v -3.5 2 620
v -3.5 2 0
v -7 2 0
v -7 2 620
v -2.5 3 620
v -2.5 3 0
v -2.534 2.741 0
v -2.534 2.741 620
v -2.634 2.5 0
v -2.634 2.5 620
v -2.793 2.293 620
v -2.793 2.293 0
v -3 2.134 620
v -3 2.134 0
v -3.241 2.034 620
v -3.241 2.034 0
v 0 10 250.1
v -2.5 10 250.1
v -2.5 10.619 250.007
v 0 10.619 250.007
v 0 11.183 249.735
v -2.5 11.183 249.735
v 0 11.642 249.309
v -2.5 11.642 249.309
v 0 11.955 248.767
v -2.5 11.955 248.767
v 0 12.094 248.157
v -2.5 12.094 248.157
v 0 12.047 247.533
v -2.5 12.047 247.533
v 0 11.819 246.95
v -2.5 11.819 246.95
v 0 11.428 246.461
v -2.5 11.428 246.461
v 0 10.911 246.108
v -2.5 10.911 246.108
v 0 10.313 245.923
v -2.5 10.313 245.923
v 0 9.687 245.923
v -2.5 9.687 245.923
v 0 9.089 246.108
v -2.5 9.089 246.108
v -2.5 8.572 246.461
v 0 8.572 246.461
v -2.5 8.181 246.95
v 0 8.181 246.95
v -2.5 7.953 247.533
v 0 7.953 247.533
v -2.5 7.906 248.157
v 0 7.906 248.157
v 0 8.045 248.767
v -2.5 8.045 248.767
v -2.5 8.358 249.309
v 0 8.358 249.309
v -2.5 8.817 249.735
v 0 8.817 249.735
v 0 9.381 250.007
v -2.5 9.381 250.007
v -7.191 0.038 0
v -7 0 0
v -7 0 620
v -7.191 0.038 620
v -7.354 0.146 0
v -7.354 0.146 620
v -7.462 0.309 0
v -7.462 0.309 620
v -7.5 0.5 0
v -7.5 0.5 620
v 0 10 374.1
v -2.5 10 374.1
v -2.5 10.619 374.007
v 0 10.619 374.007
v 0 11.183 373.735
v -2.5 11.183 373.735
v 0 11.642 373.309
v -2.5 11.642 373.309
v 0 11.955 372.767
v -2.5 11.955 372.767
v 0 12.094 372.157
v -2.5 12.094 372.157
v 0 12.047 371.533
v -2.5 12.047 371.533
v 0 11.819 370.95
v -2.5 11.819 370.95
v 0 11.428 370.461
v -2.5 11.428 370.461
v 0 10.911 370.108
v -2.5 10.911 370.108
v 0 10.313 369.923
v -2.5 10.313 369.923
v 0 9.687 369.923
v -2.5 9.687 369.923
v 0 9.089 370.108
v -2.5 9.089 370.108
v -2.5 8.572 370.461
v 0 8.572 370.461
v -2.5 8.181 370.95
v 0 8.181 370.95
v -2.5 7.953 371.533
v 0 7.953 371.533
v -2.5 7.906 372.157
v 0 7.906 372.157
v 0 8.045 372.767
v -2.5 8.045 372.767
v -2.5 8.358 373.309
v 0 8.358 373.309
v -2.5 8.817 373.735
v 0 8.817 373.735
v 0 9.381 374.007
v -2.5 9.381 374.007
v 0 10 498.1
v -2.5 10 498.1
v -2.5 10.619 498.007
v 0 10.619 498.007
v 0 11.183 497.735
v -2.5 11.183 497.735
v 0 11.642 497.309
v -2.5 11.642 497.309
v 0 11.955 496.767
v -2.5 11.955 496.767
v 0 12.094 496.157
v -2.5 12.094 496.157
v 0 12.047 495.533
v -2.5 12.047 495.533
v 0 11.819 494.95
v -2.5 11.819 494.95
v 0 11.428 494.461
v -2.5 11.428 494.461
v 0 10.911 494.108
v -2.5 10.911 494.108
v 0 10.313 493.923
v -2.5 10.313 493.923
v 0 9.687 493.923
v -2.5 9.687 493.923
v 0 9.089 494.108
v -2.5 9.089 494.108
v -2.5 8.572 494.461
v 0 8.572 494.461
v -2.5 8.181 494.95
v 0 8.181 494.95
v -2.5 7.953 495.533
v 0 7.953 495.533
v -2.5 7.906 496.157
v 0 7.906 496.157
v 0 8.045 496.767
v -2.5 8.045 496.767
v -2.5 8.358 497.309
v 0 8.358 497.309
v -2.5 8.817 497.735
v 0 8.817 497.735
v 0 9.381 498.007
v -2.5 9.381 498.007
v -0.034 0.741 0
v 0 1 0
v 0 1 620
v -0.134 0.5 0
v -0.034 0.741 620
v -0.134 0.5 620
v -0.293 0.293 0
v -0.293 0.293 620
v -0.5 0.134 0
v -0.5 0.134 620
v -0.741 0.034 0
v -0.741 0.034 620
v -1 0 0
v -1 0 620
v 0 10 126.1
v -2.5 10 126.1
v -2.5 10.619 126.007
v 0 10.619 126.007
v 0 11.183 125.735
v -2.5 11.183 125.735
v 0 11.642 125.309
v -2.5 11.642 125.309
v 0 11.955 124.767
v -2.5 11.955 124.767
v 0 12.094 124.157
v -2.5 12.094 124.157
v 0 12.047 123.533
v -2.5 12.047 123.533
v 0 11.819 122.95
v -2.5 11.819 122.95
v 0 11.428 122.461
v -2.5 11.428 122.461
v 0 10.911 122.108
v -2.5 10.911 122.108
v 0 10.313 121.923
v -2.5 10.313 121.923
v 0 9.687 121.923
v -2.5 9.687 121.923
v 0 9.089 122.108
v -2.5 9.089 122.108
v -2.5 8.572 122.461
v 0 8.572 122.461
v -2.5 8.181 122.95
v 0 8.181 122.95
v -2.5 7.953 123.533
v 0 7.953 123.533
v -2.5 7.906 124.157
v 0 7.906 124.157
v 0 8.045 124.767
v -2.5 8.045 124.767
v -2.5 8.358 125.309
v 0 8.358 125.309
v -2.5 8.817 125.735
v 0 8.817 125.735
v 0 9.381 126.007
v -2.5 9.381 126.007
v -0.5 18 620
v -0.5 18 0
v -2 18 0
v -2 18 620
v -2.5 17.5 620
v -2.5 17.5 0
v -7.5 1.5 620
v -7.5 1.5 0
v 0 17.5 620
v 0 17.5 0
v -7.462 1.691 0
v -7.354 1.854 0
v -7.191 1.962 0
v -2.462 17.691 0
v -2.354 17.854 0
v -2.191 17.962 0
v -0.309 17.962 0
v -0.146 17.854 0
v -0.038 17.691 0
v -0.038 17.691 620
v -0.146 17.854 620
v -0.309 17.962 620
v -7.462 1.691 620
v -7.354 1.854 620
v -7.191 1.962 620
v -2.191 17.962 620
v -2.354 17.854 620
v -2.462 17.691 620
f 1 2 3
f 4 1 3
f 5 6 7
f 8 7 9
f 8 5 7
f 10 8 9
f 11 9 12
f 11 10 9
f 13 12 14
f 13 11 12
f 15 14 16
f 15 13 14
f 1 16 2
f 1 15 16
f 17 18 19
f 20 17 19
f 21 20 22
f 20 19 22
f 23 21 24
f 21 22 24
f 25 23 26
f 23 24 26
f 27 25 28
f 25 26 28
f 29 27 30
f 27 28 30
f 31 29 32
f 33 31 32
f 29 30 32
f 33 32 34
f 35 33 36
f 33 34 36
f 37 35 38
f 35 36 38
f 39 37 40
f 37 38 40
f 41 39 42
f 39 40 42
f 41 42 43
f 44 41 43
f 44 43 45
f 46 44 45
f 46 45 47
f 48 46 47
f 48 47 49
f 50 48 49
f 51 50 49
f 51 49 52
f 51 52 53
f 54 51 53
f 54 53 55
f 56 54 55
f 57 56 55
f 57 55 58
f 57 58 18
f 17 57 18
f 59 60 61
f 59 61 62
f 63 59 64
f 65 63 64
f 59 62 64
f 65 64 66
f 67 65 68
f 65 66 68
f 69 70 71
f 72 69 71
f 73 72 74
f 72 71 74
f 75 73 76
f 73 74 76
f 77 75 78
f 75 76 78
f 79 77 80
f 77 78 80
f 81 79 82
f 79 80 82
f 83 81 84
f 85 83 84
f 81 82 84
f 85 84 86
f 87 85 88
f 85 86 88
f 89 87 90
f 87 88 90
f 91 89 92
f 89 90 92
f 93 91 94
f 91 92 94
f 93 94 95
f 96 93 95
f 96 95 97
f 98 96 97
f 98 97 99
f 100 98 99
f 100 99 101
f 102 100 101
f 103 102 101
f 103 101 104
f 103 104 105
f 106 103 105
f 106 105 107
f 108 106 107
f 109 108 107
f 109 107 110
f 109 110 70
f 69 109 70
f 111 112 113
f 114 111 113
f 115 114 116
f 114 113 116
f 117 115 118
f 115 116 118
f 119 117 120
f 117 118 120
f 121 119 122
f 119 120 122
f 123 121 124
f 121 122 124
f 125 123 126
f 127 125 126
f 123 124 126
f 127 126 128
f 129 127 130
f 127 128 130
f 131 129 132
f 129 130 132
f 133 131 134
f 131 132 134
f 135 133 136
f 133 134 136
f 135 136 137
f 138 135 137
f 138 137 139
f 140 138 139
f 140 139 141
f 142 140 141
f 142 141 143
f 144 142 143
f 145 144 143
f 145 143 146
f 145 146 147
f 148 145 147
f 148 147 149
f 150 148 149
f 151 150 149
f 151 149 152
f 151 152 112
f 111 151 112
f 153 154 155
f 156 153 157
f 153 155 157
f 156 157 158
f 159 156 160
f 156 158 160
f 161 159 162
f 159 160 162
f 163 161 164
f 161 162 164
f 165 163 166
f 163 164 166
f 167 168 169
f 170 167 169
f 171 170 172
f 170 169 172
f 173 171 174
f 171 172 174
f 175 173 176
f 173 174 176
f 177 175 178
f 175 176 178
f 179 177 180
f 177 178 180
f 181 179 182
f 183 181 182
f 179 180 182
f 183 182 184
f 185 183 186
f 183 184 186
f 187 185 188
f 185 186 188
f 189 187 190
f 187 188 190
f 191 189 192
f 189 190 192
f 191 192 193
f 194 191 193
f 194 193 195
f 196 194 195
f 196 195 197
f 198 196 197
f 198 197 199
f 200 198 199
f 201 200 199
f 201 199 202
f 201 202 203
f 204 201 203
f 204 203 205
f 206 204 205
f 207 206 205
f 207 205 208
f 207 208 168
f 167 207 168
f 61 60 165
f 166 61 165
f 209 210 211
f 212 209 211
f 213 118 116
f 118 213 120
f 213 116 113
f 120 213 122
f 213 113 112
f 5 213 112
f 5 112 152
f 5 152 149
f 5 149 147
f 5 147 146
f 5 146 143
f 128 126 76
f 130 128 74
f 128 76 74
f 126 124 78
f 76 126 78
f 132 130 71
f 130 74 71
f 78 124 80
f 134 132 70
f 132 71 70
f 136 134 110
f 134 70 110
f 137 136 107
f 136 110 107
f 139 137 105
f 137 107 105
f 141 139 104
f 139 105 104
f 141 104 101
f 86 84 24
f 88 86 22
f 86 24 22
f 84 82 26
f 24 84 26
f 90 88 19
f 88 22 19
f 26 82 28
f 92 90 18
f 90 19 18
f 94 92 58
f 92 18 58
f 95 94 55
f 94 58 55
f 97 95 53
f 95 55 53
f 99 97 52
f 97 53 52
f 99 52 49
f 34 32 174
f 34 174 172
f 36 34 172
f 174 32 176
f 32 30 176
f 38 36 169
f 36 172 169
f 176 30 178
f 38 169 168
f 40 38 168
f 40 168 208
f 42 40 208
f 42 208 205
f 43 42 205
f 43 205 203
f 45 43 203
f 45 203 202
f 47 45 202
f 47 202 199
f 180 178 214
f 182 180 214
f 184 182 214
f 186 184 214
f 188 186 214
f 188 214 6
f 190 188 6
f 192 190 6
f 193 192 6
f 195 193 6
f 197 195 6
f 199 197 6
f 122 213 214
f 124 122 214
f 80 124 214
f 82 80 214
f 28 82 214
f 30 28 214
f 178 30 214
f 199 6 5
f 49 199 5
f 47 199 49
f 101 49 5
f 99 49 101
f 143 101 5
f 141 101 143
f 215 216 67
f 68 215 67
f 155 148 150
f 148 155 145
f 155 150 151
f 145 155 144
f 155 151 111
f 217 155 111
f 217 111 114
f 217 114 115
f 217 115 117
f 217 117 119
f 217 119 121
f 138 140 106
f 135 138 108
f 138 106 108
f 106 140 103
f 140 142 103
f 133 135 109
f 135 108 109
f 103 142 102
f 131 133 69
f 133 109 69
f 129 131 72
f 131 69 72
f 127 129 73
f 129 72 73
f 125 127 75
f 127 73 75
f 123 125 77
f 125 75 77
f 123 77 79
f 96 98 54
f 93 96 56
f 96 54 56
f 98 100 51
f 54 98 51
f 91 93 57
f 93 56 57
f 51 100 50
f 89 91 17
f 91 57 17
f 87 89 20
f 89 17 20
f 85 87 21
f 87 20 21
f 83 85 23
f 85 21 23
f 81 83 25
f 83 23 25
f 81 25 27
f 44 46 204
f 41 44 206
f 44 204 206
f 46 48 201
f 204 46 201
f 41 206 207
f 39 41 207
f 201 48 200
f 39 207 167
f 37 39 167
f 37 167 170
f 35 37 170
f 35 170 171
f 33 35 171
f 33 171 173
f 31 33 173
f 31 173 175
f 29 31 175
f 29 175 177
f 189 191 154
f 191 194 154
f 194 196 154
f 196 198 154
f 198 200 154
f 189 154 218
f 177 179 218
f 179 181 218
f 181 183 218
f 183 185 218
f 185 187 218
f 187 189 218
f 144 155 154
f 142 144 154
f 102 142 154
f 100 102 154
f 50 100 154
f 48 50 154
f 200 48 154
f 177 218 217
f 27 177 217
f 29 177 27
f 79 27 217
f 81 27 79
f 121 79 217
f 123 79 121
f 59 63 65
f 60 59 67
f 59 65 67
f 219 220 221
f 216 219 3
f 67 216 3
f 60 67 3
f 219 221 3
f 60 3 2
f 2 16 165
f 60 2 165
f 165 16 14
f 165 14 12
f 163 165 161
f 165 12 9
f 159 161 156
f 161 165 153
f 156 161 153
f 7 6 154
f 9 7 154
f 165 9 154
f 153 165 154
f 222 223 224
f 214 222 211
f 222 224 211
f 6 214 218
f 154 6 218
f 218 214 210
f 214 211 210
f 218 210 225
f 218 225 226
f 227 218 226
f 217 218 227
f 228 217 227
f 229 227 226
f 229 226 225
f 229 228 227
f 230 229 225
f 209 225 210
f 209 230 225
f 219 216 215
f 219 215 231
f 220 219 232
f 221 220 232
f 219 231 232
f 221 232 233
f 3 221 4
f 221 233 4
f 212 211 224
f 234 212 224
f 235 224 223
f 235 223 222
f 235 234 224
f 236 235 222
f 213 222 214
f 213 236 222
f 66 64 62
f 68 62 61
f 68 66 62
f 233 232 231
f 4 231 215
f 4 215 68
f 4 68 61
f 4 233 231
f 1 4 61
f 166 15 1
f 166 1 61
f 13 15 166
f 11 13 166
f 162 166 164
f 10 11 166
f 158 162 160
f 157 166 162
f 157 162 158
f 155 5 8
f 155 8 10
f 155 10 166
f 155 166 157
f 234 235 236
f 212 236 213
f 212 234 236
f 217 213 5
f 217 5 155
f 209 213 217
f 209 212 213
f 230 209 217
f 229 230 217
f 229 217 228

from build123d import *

# Parameters (mm, degrees)
EXTRUDE_1_DEPTH    = 620
HOLE_WIZARD_M5_1_D = 4.2
FILLET_1_R         = 1
FILLET_2_R         = 0.5


with BuildPart() as part:
    # 草图1 → 凸台-拉伸1 (new body)
    with BuildSketch(Plane.XY):
        Polygon((0, 0), (0, 18), (-2.5, 18), (-2.5, 2), (-7.5, 2), (-7.5, 0), align=None)
    extrude(amount=EXTRUDE_1_DEPTH)

    # M5 螺纹孔1 (through all)
    with Locations(Plane(origin=(0, 0, 0), x_dir=(0, 0, -1), z_dir=(1, 0, 0))):
        with Locations((-496, 10), (-372, 10), (-248, 10), (-124, 10)):
            Hole(HOLE_WIZARD_M5_1_D / 2)

    # 圆角1
    fillet_1_edges = [part.edges().sort_by_distance(p)[0] for p in [
        (-2.5, 2, 310),
        (0, 0, 310),
    ]]
    fillet(fillet_1_edges, radius=FILLET_1_R)

    # 圆角2
    fillet_2_edges = [part.edges().sort_by_distance(p)[0] for p in [
        (-7.5, 0, 310),
        (-7.5, 2, 310),
        (-2.5, 18, 310),
        (0, 18, 310),
    ]]
    fillet(fillet_2_edges, radius=FILLET_2_R)


solid = part.part
